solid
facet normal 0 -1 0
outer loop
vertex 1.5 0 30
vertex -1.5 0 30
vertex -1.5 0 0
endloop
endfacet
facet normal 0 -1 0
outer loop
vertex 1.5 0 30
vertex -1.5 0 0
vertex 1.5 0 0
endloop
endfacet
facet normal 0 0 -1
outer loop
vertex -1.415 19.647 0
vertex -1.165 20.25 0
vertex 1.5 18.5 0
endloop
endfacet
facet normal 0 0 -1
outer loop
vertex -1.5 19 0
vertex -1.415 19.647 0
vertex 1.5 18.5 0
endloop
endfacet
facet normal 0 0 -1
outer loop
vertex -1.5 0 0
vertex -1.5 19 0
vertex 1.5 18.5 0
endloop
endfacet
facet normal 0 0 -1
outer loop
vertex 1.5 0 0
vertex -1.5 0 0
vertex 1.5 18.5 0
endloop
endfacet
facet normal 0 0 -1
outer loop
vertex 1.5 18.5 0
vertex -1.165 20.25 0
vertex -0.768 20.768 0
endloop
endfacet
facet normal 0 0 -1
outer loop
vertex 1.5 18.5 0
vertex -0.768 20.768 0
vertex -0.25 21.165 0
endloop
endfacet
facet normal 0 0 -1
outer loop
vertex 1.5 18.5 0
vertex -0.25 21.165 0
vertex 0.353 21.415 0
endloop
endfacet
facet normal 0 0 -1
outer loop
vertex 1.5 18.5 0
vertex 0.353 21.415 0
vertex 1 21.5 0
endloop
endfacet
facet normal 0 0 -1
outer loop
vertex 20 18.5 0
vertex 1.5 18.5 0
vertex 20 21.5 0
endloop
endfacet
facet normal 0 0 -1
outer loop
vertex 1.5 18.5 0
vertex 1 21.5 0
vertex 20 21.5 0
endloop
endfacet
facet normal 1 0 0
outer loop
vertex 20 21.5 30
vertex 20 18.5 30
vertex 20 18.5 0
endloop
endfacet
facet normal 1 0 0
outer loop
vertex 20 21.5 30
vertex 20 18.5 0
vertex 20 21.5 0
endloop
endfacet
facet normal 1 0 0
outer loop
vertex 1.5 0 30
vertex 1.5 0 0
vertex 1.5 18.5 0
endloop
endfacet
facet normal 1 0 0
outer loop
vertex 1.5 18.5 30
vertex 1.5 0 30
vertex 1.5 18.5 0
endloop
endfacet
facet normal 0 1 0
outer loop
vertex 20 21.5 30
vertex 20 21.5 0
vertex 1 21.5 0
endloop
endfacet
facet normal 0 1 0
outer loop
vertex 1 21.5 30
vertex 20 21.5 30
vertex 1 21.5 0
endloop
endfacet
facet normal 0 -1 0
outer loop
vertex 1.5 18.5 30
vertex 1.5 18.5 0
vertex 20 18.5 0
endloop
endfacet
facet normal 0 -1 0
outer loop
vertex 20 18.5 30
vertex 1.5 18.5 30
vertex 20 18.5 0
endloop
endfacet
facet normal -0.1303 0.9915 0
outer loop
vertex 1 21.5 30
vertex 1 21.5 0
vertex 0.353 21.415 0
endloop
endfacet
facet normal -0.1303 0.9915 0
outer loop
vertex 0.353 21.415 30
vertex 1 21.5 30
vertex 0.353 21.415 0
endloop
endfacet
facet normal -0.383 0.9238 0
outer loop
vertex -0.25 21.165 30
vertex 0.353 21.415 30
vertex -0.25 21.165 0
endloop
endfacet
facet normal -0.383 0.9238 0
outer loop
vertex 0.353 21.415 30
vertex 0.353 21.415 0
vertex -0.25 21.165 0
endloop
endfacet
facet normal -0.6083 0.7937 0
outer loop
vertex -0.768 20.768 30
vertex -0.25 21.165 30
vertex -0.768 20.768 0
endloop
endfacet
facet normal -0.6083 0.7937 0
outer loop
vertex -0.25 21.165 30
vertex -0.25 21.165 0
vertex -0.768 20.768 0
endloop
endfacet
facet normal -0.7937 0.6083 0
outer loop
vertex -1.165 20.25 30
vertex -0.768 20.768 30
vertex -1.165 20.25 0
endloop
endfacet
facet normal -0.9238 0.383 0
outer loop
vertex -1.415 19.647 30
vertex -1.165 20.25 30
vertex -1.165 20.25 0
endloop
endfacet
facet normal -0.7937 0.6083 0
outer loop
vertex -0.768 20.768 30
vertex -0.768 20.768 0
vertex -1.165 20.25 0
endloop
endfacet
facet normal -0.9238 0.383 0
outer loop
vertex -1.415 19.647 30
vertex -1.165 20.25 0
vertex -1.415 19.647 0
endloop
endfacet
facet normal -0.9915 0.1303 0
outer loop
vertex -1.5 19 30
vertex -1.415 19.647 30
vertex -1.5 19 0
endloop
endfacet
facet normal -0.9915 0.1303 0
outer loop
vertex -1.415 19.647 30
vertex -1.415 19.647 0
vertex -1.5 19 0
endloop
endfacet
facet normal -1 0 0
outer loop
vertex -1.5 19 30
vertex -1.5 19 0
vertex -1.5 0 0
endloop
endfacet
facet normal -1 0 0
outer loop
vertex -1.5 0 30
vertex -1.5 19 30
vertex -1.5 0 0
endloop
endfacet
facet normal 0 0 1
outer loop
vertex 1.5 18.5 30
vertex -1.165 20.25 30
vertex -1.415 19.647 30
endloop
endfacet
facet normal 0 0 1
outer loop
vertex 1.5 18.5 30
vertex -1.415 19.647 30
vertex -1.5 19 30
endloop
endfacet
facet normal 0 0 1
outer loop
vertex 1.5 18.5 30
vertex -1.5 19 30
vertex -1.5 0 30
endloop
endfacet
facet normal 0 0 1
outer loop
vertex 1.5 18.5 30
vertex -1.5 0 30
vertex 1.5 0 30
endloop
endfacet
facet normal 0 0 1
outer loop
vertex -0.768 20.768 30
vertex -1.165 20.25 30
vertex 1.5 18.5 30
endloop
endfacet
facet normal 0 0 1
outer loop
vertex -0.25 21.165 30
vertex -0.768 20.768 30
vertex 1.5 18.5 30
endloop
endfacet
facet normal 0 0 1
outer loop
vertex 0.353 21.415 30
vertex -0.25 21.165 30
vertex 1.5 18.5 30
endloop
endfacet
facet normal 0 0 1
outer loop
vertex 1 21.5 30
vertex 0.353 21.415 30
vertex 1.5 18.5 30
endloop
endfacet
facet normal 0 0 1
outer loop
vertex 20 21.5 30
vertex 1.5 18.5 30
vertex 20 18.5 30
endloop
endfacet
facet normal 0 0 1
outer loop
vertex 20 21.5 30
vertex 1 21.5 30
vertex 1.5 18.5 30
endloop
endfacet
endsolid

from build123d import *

# Parameters (mm, degrees)
BOSS_EXTRUDE1_DEPTH = 30


with BuildPart() as part:
    # Sketch1 → Boss-Extrude1 (new body)
    with BuildSketch(Plane.XY):
        with BuildLine():
            Line((0, 19), (0, 0))
            Line((0, 0), (1.5, 0))
            Line((1.5, 0), (1.5, 18.5))
            Line((1.5, 18.5), (20, 18.5))
            Line((20, 18.5), (20, 20))
            Line((20, 20), (1, 20))
            ThreePointArc((1, 20), (0.292893219, 19.707106781), (0, 19))
        make_face()
        with BuildLine():
            Line((-1.5, 0), (0, 0))
            Line((0, 0), (0, 19))
            ThreePointArc((0, 19), (0.292893219, 19.707106781), (1, 20))
            Line((1, 20), (20, 20))
            Line((20, 20), (20, 21.5))
            Line((20, 21.5), (1, 21.5))
            ThreePointArc((1, 21.5), (-0.767766953, 20.767766953), (-1.5, 19))
            Line((-1.5, 19), (-1.5, 0))
        make_face()
    extrude(amount=BOSS_EXTRUDE1_DEPTH)


solid = part.part
